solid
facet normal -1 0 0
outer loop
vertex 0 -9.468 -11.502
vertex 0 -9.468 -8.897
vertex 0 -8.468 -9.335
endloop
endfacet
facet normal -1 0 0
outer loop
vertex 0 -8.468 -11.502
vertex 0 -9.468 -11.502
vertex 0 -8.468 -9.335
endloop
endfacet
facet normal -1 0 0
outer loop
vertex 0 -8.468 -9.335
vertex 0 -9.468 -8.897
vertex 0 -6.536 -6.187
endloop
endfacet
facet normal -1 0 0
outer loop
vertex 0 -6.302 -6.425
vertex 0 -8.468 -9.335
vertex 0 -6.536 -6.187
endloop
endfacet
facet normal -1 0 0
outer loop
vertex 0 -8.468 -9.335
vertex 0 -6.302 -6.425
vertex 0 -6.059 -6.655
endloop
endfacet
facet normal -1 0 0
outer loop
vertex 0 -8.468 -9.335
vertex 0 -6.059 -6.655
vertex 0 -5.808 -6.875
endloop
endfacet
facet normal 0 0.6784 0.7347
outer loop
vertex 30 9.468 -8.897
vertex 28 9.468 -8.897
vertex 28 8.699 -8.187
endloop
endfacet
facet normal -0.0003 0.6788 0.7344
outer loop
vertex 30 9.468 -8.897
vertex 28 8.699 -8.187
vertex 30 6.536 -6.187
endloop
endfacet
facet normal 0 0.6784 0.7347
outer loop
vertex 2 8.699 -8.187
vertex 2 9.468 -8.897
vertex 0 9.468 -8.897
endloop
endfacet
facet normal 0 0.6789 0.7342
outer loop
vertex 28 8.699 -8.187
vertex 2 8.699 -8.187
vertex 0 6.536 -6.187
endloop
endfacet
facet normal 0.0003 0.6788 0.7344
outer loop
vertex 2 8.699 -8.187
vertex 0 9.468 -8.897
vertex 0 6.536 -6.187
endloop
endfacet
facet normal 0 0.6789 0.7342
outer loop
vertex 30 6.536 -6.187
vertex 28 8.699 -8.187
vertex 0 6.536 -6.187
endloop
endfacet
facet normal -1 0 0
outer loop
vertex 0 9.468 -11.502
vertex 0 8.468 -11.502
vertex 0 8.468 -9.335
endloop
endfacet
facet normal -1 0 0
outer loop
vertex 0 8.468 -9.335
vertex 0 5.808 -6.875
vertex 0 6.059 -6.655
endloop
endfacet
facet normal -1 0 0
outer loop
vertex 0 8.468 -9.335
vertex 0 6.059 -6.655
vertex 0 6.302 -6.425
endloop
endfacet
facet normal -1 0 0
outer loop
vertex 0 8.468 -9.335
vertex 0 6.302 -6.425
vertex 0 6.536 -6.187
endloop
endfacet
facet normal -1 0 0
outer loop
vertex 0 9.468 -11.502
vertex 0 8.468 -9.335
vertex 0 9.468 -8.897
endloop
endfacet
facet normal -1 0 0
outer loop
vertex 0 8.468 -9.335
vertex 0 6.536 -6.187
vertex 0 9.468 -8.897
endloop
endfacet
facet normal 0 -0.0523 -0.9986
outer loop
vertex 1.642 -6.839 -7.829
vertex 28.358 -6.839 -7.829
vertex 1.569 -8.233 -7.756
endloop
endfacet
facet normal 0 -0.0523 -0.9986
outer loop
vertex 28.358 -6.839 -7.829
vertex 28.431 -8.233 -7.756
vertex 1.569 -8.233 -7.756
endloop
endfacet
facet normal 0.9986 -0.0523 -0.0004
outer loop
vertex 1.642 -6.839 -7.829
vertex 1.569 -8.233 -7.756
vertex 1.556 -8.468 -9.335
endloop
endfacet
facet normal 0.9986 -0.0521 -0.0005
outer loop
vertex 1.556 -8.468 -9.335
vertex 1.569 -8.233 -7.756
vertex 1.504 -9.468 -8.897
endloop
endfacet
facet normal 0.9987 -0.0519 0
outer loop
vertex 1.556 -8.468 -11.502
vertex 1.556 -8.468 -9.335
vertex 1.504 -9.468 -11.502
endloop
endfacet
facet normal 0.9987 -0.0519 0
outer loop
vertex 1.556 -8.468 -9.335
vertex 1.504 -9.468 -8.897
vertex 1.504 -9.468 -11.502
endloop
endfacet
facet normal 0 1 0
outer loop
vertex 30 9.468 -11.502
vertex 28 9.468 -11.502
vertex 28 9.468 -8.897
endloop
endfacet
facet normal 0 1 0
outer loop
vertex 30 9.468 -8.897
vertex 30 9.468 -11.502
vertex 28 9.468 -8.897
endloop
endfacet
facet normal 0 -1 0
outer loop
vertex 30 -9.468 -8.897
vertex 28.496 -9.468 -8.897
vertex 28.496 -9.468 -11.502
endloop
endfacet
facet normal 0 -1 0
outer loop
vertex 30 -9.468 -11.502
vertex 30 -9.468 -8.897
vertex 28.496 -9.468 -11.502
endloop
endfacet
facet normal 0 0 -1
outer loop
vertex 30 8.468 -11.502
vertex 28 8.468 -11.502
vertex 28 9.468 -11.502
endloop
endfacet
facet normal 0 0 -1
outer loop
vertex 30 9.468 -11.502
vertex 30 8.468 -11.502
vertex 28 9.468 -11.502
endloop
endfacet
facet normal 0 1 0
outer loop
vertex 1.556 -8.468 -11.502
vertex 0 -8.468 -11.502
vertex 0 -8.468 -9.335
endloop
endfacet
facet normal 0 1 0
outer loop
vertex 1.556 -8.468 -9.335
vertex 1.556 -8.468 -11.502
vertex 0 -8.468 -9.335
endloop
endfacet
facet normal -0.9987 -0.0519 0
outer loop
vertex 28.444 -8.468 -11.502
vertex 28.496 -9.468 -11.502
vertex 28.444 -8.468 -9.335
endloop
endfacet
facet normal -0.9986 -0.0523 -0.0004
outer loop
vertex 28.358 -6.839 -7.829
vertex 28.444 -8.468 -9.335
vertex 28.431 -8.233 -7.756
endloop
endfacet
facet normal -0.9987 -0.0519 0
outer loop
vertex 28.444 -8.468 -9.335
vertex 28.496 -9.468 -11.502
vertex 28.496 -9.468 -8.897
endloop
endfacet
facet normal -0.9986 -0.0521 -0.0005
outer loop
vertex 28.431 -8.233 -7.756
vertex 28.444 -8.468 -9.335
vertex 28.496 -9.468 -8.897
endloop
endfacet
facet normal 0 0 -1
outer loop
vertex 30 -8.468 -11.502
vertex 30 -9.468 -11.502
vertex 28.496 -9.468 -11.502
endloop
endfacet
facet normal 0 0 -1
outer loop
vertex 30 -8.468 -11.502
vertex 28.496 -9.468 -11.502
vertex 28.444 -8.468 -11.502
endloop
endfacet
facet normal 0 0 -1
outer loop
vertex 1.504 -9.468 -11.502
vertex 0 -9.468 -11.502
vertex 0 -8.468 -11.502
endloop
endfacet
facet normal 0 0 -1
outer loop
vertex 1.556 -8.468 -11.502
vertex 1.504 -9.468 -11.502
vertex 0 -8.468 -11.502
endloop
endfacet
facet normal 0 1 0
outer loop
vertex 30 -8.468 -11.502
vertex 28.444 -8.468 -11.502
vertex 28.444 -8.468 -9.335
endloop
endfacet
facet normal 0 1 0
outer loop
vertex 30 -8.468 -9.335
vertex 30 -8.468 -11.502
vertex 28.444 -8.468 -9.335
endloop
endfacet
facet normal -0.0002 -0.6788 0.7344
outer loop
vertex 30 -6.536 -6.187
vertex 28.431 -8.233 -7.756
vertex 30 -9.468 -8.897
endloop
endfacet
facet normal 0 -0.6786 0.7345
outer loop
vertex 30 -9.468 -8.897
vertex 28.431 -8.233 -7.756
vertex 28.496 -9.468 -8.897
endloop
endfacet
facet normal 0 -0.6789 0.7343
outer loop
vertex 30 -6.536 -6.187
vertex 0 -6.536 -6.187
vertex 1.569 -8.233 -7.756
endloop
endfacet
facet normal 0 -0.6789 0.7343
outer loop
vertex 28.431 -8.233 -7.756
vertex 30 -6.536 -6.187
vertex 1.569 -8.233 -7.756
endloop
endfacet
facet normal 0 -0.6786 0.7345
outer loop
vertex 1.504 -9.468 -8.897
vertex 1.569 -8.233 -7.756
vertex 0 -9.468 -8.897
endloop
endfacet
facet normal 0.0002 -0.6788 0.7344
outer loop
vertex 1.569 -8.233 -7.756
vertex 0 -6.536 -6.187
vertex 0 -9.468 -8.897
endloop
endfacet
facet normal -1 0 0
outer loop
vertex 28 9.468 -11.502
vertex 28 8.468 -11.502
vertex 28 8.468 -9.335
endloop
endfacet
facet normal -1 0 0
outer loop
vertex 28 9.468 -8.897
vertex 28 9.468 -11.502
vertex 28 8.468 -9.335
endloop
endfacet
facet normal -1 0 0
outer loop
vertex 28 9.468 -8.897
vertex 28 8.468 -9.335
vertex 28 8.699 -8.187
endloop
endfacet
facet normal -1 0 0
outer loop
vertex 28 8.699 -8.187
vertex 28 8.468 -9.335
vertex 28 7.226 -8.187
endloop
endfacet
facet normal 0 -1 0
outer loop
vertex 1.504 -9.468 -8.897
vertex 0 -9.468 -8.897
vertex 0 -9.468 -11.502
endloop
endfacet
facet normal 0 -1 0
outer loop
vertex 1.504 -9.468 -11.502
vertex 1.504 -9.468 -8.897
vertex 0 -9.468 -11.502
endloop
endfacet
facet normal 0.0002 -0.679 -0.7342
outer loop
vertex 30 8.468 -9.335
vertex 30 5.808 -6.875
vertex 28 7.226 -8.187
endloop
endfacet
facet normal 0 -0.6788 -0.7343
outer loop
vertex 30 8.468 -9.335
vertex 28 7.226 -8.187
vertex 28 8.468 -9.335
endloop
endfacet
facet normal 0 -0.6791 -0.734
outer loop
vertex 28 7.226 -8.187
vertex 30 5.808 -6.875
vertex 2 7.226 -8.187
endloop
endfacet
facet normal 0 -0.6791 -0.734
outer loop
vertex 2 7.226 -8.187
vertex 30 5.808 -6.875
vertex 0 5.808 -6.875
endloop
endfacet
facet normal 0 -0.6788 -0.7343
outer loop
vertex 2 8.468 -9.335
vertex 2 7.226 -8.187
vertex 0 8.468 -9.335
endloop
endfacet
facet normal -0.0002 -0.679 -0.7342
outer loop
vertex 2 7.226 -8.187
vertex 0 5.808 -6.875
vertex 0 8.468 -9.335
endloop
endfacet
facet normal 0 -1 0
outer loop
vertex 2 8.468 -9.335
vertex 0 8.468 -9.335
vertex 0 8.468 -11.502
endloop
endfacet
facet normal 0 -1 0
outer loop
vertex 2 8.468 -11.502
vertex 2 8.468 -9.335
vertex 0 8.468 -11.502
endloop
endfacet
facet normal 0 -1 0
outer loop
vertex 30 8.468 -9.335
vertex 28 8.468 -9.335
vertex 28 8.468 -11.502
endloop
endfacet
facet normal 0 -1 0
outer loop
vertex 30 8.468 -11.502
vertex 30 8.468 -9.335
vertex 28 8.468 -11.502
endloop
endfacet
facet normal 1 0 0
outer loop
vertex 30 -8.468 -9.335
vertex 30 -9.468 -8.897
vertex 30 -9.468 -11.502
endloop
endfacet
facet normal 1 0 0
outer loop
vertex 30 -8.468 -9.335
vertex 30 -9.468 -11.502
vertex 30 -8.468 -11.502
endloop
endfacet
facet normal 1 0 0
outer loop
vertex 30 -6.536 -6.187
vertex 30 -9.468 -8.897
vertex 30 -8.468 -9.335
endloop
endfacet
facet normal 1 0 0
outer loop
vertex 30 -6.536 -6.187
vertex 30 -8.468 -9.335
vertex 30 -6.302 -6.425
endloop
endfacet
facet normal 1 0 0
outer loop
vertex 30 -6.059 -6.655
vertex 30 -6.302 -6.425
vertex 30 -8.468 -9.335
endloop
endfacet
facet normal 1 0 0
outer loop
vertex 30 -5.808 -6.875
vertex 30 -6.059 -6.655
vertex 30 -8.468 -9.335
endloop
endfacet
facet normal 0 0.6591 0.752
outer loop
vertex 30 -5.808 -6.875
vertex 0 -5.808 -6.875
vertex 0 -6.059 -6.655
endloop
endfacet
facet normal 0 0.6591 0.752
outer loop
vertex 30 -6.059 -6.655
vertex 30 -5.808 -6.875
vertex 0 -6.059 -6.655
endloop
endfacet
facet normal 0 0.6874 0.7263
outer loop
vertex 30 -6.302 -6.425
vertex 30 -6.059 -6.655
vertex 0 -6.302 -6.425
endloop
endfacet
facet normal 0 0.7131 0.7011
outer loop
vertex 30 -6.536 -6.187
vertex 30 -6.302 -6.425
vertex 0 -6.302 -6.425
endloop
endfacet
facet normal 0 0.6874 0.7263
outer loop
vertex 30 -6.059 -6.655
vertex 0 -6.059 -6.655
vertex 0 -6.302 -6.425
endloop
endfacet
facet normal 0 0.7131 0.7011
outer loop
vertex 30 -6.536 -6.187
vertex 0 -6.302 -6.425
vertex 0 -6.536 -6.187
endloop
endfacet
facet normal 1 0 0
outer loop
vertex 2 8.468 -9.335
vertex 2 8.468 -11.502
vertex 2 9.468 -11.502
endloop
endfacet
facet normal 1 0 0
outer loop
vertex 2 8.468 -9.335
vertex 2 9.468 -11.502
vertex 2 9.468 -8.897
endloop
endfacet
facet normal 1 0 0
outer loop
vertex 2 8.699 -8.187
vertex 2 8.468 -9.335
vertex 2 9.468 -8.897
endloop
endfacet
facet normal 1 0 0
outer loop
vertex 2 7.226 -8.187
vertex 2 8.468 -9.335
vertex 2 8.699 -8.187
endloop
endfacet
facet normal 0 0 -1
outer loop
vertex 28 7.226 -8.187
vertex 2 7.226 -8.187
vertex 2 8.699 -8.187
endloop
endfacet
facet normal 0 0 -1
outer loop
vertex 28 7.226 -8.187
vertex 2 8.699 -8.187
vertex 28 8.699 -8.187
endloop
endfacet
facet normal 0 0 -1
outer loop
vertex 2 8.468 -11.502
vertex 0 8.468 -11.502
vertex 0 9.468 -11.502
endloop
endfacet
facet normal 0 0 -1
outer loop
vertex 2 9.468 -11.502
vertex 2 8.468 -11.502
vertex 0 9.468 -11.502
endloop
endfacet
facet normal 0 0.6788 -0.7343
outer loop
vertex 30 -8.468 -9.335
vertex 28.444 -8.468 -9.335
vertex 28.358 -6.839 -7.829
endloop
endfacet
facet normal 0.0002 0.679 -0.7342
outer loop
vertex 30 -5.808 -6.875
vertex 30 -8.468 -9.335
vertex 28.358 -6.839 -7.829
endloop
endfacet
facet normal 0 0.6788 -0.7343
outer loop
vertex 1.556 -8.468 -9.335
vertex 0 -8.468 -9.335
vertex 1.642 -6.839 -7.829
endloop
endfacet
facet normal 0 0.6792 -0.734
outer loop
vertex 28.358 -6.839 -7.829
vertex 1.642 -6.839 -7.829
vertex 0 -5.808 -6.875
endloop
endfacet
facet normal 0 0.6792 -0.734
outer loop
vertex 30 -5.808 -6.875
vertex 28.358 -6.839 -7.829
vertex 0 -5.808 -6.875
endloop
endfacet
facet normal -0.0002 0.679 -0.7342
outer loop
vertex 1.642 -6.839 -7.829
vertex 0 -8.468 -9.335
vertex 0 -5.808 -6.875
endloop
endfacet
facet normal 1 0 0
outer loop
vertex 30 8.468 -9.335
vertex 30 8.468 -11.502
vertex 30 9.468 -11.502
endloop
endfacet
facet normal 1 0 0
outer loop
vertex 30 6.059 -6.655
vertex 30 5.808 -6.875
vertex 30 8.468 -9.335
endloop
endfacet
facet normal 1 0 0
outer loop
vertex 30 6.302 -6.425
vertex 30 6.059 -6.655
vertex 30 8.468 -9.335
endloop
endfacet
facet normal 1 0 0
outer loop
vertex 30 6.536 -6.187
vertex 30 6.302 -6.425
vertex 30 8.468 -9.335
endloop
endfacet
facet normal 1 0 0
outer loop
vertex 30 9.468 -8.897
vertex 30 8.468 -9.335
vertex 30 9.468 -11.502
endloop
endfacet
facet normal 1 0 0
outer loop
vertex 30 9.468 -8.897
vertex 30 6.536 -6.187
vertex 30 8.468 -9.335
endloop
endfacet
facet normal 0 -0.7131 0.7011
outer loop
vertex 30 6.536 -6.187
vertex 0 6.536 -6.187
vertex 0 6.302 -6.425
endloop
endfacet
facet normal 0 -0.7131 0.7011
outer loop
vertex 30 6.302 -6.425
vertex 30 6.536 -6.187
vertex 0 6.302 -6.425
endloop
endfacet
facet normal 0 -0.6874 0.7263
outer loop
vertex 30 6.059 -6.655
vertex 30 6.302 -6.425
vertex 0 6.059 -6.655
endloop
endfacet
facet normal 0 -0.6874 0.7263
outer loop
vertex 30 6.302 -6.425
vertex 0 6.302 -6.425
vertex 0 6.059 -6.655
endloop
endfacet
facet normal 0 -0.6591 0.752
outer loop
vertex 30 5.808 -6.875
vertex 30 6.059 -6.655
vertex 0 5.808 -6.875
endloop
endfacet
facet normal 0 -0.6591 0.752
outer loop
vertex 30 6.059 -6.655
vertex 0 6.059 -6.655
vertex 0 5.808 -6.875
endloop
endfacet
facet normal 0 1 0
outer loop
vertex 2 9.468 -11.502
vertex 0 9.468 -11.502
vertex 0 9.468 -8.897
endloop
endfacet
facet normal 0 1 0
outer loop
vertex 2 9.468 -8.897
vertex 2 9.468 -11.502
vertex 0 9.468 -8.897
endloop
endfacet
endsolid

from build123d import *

# Parameters (mm, degrees)
F1_DEPTH = 30
F2_W     = 26
F2_H     = 5
F3_DEPTH = 25
F3_TAPER = -3
F4_DEPTH = 25


with BuildPart() as f1:
    # F0 (on Right) → F1 (new body)
    with BuildSketch(Plane.YZ):
        with BuildLine():
            ThreePointArc((6.5361338316, -6.186998831), (6.1814877812, -6.5413461008), (5.8076611231, -6.8753961544))
            Line((5.8076611231, -6.8753961544), (8.4675702751, -9.3346675858))
            Line((8.4675702751, -9.3346675858), (8.4675702751, -11.5024931729))
            Line((8.4675702751, -11.5024931729), (9.4675702751, -11.5024931729))
            Line((9.4675702751, -11.5024931729), (9.4675702751, -8.8973161713))
            Line((9.4675702751, -8.8973161713), (6.5361338316, -6.186998831))
        make_face()
    extrude(amount=F1_DEPTH)

    # F2 (on Front) → F4 (cut)
    with BuildSketch(Plane.XZ):
        with Locations((15, -10.686998831)):
            Rectangle(F2_W, F2_H)
    extrude(amount=-F4_DEPTH, mode=Mode.SUBTRACT)


with BuildPart() as f1b:
    # F0 (on Right) → F1, piece 2 (new body)
    with BuildSketch(Plane.YZ):
        with BuildLine():
            ThreePointArc((-5.8076611231, -6.8753961544), (-6.1814877812, -6.5413461008), (-6.5361338316, -6.186998831))
            Line((-6.5361338316, -6.186998831), (-9.4675702751, -8.8973161713))
            Line((-9.4675702751, -8.8973161713), (-9.4675702751, -11.5024931729))
            Line((-9.4675702751, -11.5024931729), (-8.4675702751, -11.5024931729))
            Line((-8.4675702751, -11.5024931729), (-8.4675702751, -9.3346675858))
            Line((-8.4675702751, -9.3346675858), (-5.8076611231, -6.8753961544))
        make_face()
    extrude(amount=F1_DEPTH)

    # F2 (on Front) → F3 (cut)
    with BuildSketch(Plane.XZ):
        with Locations((15, -10.686998831)):
            Rectangle(F2_W, F2_H)
    extrude(amount=F3_DEPTH, taper=F3_TAPER, mode=Mode.SUBTRACT)


solid = Compound([f1.part, f1b.part])
